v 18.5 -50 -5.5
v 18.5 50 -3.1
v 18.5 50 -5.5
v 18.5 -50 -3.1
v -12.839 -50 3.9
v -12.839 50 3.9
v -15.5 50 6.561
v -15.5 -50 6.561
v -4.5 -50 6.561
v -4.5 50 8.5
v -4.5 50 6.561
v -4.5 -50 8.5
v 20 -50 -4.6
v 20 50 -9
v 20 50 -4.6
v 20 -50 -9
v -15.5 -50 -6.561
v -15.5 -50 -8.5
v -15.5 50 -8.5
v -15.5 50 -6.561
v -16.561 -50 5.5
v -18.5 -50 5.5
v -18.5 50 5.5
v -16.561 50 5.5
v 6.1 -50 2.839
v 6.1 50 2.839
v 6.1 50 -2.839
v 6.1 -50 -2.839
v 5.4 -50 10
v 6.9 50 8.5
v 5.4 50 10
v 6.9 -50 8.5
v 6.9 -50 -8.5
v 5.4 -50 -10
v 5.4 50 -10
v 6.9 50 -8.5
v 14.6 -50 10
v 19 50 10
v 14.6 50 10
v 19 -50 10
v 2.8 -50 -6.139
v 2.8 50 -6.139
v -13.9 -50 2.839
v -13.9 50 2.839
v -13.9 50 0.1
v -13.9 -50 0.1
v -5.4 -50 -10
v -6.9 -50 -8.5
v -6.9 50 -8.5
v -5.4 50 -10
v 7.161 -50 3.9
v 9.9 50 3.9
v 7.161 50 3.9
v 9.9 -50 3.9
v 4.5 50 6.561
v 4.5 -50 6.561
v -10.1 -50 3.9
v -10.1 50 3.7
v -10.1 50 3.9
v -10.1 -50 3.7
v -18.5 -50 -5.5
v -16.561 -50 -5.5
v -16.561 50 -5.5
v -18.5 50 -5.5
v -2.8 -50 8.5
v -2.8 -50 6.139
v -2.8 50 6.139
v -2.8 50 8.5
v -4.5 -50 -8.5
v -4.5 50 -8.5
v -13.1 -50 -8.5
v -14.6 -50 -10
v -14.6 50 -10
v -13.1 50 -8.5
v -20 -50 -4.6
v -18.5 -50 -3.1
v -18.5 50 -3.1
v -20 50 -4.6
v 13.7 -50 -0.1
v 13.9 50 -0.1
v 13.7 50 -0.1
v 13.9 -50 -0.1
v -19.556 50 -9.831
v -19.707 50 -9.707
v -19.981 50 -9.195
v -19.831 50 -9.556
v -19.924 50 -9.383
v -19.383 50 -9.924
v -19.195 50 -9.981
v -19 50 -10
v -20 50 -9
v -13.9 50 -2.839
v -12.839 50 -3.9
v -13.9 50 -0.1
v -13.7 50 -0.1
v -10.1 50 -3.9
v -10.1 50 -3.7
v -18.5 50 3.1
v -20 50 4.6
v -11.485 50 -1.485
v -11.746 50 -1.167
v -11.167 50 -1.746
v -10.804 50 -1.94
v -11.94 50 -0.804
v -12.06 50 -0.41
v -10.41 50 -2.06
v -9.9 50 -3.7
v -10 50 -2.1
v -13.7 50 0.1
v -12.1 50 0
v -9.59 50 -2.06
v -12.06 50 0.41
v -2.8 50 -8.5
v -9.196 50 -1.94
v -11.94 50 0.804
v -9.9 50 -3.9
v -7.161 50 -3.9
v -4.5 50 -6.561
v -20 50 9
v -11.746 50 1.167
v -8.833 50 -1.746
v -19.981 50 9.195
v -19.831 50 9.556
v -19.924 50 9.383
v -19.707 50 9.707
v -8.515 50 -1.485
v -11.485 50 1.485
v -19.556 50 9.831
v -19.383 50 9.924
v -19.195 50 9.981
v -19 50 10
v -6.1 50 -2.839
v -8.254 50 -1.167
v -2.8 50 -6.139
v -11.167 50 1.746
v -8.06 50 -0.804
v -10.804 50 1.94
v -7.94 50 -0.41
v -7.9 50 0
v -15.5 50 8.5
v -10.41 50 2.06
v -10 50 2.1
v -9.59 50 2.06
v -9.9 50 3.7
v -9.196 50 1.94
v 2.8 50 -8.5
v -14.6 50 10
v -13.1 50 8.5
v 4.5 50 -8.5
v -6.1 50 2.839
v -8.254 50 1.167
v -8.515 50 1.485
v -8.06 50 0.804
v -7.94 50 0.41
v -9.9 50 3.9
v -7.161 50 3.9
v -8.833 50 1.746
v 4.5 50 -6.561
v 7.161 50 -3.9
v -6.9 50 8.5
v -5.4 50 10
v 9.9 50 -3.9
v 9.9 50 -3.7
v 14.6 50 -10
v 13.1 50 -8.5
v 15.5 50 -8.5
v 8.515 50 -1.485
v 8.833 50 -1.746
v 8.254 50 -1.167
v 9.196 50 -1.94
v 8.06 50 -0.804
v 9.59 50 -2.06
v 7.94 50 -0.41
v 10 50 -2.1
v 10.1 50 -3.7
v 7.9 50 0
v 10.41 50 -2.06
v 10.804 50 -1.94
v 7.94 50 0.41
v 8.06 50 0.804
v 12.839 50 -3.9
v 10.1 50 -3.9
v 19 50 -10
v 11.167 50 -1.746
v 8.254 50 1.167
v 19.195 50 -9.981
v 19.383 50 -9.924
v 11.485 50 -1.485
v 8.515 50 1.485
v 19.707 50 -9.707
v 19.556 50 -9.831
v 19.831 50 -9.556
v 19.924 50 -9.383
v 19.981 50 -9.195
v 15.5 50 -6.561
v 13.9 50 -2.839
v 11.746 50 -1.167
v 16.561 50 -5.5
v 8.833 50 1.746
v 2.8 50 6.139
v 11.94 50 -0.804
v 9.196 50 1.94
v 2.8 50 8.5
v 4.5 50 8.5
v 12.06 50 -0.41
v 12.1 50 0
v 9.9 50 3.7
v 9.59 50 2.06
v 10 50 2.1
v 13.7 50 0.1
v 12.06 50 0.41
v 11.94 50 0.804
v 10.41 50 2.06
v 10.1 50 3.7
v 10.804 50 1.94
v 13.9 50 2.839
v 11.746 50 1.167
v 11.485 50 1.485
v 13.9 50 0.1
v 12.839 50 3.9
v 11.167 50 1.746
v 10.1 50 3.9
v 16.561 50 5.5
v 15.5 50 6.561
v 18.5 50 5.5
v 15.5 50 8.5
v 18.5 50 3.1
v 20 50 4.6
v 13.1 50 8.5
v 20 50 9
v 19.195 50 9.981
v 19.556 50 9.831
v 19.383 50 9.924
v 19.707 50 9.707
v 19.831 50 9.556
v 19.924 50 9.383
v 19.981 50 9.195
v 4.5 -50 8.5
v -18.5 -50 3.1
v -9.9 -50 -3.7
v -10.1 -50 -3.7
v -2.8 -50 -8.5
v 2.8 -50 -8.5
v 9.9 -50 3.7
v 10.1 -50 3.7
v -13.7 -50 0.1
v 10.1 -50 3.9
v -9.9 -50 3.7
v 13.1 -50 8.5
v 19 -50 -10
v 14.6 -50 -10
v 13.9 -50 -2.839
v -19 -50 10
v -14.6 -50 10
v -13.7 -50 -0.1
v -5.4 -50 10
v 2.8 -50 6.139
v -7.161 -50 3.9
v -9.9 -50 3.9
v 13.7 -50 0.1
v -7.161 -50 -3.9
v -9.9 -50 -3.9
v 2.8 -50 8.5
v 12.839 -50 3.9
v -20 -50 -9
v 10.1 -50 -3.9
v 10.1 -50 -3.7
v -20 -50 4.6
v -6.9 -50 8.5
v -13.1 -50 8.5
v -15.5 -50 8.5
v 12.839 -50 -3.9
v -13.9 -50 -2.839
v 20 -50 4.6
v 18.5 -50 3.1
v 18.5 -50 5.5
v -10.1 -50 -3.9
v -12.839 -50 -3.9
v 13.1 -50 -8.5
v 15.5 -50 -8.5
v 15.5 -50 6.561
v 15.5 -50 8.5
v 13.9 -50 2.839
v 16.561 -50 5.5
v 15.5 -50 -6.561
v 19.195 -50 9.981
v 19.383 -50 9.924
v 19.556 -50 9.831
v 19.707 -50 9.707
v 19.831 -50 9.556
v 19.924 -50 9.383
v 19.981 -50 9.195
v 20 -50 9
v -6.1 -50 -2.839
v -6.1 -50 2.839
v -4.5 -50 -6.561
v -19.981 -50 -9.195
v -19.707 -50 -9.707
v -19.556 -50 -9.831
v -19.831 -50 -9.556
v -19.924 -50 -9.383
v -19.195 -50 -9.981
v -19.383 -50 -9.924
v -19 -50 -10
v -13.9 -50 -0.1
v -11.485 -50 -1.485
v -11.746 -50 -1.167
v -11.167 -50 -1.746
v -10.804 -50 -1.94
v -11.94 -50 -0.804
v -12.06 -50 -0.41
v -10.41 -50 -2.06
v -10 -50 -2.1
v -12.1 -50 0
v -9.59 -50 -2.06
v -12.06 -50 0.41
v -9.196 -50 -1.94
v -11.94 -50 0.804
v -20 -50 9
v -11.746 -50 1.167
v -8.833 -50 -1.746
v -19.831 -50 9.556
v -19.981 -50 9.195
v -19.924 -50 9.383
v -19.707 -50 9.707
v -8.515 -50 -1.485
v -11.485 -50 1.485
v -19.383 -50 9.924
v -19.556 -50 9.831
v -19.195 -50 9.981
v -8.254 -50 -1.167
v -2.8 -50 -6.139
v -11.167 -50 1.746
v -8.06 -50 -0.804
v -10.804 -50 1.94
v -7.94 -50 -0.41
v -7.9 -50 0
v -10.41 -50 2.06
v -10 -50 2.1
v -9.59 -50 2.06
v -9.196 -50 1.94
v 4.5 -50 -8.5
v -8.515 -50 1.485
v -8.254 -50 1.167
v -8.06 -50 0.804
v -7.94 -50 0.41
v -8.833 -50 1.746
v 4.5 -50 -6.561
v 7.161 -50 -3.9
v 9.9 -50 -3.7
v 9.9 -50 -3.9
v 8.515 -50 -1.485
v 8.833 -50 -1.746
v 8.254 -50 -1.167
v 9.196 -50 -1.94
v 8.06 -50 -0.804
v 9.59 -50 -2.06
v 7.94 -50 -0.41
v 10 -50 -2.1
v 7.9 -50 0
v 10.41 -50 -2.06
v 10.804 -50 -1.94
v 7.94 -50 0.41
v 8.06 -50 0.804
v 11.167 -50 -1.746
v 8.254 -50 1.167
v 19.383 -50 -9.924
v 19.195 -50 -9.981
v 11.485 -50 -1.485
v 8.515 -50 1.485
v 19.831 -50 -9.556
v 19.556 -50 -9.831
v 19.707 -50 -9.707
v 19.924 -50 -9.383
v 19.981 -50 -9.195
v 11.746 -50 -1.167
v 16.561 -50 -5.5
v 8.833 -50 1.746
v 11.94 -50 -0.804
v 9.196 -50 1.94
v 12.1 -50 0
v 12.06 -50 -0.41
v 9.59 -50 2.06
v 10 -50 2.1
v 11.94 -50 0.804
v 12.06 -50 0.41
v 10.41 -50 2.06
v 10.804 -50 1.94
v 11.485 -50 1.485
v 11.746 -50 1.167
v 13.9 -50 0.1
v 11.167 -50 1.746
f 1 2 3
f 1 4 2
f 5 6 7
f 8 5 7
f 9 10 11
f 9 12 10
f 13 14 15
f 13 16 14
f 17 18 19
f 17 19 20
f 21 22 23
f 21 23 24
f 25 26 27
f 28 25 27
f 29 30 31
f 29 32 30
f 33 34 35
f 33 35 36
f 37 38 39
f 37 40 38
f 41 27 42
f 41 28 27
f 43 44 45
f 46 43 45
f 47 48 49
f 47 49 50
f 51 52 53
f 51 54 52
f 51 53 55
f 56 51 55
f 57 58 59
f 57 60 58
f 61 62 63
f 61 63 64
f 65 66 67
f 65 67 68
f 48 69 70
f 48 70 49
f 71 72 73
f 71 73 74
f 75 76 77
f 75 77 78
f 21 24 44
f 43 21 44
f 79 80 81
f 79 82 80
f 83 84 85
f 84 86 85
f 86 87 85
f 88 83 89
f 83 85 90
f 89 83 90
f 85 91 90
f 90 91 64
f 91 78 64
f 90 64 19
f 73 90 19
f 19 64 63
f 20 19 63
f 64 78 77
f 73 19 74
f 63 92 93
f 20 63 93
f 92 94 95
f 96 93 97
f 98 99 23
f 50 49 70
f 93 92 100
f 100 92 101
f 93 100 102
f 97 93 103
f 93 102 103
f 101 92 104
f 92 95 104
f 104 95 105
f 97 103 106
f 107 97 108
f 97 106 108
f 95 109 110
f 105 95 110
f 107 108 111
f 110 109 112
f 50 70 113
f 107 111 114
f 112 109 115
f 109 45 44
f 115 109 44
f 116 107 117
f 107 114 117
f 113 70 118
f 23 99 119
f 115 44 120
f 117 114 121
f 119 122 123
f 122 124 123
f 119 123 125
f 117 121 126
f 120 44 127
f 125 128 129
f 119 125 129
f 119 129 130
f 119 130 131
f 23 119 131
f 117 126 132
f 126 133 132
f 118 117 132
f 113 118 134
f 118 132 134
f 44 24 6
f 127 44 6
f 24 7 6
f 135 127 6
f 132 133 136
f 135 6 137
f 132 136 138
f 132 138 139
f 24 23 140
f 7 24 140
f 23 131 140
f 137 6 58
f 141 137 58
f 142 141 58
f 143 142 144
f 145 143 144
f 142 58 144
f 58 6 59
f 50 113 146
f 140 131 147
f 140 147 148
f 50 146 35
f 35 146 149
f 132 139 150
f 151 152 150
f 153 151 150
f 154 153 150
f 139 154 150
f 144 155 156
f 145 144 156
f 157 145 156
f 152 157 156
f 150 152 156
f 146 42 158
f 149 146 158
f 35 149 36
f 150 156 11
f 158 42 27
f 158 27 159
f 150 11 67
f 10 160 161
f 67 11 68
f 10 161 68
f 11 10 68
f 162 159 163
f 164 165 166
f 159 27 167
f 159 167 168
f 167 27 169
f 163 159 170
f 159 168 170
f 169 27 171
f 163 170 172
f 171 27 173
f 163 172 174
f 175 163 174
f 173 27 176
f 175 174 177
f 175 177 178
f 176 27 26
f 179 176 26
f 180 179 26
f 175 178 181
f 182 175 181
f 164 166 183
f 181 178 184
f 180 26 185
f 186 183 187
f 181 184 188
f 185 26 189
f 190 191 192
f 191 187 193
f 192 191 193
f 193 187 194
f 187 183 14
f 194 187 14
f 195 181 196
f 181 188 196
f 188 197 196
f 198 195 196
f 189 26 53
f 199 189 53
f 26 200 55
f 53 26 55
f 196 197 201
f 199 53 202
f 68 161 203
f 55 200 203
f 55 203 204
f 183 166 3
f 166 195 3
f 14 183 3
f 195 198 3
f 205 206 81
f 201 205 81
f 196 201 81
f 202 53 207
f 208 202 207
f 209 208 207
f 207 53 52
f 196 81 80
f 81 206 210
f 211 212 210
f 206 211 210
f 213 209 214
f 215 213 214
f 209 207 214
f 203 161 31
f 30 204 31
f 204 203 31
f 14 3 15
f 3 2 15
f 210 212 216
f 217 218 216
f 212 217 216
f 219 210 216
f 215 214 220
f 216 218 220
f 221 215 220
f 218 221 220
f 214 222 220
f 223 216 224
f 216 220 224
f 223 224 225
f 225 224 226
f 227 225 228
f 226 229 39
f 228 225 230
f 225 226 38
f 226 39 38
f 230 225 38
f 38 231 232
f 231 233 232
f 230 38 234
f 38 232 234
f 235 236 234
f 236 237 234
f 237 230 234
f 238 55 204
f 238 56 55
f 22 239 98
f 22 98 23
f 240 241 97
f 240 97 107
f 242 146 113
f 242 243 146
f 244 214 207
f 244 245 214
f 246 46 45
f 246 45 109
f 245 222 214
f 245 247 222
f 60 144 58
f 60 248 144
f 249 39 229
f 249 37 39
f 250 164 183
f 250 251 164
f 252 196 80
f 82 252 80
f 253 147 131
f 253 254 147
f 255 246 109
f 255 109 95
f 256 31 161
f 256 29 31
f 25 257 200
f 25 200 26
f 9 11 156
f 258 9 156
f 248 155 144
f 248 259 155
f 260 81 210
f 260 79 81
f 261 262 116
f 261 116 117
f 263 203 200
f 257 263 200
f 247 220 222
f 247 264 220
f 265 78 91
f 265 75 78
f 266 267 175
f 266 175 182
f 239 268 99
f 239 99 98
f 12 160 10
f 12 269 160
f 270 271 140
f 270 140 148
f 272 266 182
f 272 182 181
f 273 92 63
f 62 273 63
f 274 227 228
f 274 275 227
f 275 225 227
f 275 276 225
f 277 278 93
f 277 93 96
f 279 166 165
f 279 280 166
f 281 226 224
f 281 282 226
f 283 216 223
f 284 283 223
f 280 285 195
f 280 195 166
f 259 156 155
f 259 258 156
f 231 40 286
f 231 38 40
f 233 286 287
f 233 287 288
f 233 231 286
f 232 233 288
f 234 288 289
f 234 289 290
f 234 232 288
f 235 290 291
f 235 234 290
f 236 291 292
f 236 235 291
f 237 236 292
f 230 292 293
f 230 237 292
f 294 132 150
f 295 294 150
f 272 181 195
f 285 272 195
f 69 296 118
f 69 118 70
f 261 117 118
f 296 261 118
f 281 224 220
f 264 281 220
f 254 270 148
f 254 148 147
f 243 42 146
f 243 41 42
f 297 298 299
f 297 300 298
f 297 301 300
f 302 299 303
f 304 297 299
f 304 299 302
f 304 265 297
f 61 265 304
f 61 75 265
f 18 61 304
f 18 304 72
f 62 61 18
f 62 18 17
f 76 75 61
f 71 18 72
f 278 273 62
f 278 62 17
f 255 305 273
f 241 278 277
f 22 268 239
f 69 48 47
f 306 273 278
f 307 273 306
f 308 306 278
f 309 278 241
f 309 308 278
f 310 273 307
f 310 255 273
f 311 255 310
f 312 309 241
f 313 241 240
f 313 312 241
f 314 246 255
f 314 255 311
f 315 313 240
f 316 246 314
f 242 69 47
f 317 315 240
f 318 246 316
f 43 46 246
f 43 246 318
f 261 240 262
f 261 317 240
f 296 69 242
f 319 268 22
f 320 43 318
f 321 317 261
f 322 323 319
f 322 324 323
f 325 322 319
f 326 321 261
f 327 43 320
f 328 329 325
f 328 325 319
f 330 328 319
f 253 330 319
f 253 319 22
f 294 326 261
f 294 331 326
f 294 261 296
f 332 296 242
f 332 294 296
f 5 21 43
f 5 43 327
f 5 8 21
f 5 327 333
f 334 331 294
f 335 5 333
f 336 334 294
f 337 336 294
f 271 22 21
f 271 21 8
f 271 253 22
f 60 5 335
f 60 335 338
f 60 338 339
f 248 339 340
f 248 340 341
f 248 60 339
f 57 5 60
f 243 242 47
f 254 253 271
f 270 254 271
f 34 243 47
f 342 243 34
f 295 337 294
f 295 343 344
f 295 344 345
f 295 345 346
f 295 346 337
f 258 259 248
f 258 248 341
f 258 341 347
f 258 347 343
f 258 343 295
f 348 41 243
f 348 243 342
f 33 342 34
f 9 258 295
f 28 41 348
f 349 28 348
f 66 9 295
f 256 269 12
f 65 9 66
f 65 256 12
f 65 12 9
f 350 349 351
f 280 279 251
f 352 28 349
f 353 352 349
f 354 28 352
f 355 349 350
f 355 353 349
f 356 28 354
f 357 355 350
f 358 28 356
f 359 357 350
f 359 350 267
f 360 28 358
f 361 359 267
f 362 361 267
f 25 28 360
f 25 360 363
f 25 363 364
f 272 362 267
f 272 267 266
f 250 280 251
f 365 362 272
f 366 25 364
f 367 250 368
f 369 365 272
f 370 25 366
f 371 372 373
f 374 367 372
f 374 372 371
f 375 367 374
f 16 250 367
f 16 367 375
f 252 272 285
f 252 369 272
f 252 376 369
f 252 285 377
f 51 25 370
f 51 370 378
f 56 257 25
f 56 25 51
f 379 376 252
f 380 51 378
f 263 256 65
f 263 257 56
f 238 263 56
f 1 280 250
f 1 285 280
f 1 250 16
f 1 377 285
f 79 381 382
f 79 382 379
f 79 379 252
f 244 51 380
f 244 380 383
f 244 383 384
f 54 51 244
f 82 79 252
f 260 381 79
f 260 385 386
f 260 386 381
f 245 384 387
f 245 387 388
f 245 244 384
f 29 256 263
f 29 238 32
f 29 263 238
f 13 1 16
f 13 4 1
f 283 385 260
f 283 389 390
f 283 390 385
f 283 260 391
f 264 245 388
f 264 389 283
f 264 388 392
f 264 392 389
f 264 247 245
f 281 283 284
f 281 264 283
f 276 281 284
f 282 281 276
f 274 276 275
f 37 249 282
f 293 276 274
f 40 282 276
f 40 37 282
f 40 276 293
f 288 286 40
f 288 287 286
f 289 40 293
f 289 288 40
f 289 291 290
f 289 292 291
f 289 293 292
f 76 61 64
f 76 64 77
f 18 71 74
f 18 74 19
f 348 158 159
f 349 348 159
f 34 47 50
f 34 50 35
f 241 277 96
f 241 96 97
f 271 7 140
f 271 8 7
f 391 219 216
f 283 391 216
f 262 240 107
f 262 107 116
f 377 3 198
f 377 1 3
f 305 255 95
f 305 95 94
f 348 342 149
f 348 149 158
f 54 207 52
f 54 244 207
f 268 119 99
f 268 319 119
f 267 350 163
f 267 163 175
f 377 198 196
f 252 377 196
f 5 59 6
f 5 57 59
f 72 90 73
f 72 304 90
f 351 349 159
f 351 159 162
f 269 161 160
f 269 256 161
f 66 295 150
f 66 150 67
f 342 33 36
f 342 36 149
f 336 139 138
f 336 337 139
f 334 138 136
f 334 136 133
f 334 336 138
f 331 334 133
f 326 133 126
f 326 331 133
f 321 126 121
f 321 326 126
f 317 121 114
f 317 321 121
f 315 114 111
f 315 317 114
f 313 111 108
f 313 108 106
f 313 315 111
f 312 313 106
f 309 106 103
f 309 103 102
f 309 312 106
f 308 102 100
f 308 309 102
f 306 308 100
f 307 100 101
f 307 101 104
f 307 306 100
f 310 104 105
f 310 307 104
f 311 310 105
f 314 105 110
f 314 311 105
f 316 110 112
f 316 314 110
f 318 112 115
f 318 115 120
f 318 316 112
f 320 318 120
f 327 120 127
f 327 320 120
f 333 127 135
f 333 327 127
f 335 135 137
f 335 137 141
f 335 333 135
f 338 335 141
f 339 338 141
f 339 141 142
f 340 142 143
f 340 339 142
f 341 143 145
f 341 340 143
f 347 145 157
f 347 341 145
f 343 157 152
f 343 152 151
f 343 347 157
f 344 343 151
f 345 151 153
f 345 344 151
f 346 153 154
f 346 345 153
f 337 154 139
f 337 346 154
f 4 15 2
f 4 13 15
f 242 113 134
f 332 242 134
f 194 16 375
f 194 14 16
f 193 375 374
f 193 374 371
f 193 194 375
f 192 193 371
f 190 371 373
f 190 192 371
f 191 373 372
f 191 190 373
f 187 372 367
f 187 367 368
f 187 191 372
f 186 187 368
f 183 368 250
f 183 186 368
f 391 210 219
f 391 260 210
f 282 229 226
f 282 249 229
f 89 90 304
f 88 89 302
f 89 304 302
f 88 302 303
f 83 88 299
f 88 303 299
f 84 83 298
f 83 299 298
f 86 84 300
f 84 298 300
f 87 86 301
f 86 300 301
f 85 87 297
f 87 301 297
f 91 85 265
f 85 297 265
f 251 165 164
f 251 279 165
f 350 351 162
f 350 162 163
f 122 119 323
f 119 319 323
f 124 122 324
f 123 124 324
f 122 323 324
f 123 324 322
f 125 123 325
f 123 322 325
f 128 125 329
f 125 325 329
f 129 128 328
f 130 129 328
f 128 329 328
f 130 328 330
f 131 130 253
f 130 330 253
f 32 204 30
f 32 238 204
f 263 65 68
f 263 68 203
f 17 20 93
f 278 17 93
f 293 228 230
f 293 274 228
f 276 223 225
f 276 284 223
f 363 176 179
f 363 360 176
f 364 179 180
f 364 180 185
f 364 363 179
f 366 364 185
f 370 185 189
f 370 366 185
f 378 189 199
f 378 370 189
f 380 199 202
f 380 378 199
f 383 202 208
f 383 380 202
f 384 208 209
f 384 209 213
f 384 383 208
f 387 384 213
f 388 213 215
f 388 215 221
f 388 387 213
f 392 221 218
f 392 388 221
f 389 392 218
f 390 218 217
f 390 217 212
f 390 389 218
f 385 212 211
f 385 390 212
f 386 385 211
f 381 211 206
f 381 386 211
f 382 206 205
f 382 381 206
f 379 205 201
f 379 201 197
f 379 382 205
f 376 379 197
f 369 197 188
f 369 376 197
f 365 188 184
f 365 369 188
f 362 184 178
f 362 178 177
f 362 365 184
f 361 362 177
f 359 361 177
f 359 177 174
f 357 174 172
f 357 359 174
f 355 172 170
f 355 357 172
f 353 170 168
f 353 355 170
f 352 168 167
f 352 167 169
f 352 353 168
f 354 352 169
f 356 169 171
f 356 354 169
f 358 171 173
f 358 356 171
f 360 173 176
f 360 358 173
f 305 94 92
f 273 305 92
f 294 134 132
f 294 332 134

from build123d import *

# Parameters (mm, degrees)
F1_DEPTH = 50
F2_R     = 1


with BuildPart() as f1:
    # F0 (on Front) → F1 (new body, symmetric)
    with BuildSketch(Plane.XZ):
        Polygon((-15.5, 6.5606601718), (-15.5, 8.4999998663), (-13.1, 8.4999998663), (-14.6, 9.9999998663), (-20, 9.9999998663), (-20, 4.5999998663), (-18.4999998663, 3.1), (-18.4999998663, 5.5), (-16.5606601718, 5.5), (-13.9, 2.8393398282), (-13.9, 0.1), (-13.7, 0.1), (-13.7, 0), (-13.7, -0.1), (-13.9, -0.1), (-13.9, -2.8393398282), (-16.5606601718, -5.5), (-18.4999998663, -5.5), (-18.4999998663, -3.1), (-20, -4.5999998663), (-20, -9.9999998663), (-14.6, -9.9999998663), (-13.1, -8.4999998663), (-15.5, -8.4999998663), (-15.5, -6.5606601718), (-12.8393398282, -3.9), (-10.1, -3.9), (-10.1, -3.7), (-9.9, -3.7), (-9.9, -3.9), (-7.1606601718, -3.9), (-4.5, -6.5606601718), (-4.5, -8.4999998663), (-6.9, -8.4999998663), (-5.4, -9.9999998663), (0, -9.9999998663), (5.4, -9.9999998663), (6.9, -8.4999998663), (4.5, -8.4999998663), (4.5, -6.5606601718), (7.1606601718, -3.9), (9.9, -3.9), (9.9, -3.7), (10.1, -3.7), (10.1, -3.9), (12.8393398282, -3.9), (15.5, -6.5606601718), (15.5, -8.4999998663), (13.1, -8.4999998663), (14.6, -9.9999998663), (20, -9.9999998663), (20, -4.5999998663), (18.4999998663, -3.1), (18.4999998663, -5.5), (16.5606601718, -5.5), (13.9, -2.8393398282), (13.9, -0.1), (13.7, -0.1), (13.7, 0), (13.7, 0.1), (13.9, 0.1), (13.9, 2.8393398282), (16.5606601718, 5.5), (18.4999998663, 5.5), (18.4999998663, 3.1), (20, 4.5999998663), (20, 9.9999998663), (14.6, 9.9999998663), (13.1, 8.4999998663), (15.5, 8.4999998663), (15.5, 6.5606601718), (12.8393398282, 3.9), (10.1, 3.9), (10.1, 3.7), (9.9, 3.7), (9.9, 3.9), (7.1606601718, 3.9), (4.5, 6.5606601718), (4.5, 8.4999998663), (6.9, 8.4999998663), (5.4, 9.9999998663), (0, 9.9999998663), (-5.4, 9.9999998663), (-6.9, 8.4999998663), (-4.5, 8.4999998663), (-4.5, 6.5606601718), (-7.1606601718, 3.9), (-9.9, 3.9), (-9.9, 3.7), (-10.1, 3.7), (-10.1, 3.9), (-12.8393398282, 3.9), align=None)
        with BuildLine():
            ThreePointArc((-12.1, 0), (-10, 2.1), (-7.9, 0))
            ThreePointArc((-7.9, 0), (-10, -2.1), (-12.1, 0))
        make_face(mode=Mode.SUBTRACT)
        Polygon((-6.1, 2.8393398282), (-2.8, 6.1393398282), (-2.8, 8.4999998663), (0, 8.4999998663), (2.8, 8.4999998663), (2.8, 6.1393398282), (6.1, 2.8393398282), (6.1, 0), (6.1, -2.8393398282), (2.8, -6.1393398282), (2.8, -8.4999998663), (0, -8.4999998663), (-2.8, -8.4999998663), (-2.8, -6.1393398282), (-6.1, -2.8393398282), (-6.1, 0), align=None, mode=Mode.SUBTRACT)
        with BuildLine():
            ThreePointArc((12.1, 0), (10, -2.1), (7.9, 0))
            ThreePointArc((7.9, 0), (10, 2.1), (12.1, 0))
        make_face(mode=Mode.SUBTRACT)
    extrude(amount=F1_DEPTH, both=True)

    # F2
    f2_edges = [f1.edges().sort_by_distance(p)[0] for p in [
        (-20, 0, 10),
        (20, 0, 10),
        (20, 0, -10),
        (-20, 0, -10),
    ]]
    fillet(f2_edges, radius=F2_R)


solid = f1.part
